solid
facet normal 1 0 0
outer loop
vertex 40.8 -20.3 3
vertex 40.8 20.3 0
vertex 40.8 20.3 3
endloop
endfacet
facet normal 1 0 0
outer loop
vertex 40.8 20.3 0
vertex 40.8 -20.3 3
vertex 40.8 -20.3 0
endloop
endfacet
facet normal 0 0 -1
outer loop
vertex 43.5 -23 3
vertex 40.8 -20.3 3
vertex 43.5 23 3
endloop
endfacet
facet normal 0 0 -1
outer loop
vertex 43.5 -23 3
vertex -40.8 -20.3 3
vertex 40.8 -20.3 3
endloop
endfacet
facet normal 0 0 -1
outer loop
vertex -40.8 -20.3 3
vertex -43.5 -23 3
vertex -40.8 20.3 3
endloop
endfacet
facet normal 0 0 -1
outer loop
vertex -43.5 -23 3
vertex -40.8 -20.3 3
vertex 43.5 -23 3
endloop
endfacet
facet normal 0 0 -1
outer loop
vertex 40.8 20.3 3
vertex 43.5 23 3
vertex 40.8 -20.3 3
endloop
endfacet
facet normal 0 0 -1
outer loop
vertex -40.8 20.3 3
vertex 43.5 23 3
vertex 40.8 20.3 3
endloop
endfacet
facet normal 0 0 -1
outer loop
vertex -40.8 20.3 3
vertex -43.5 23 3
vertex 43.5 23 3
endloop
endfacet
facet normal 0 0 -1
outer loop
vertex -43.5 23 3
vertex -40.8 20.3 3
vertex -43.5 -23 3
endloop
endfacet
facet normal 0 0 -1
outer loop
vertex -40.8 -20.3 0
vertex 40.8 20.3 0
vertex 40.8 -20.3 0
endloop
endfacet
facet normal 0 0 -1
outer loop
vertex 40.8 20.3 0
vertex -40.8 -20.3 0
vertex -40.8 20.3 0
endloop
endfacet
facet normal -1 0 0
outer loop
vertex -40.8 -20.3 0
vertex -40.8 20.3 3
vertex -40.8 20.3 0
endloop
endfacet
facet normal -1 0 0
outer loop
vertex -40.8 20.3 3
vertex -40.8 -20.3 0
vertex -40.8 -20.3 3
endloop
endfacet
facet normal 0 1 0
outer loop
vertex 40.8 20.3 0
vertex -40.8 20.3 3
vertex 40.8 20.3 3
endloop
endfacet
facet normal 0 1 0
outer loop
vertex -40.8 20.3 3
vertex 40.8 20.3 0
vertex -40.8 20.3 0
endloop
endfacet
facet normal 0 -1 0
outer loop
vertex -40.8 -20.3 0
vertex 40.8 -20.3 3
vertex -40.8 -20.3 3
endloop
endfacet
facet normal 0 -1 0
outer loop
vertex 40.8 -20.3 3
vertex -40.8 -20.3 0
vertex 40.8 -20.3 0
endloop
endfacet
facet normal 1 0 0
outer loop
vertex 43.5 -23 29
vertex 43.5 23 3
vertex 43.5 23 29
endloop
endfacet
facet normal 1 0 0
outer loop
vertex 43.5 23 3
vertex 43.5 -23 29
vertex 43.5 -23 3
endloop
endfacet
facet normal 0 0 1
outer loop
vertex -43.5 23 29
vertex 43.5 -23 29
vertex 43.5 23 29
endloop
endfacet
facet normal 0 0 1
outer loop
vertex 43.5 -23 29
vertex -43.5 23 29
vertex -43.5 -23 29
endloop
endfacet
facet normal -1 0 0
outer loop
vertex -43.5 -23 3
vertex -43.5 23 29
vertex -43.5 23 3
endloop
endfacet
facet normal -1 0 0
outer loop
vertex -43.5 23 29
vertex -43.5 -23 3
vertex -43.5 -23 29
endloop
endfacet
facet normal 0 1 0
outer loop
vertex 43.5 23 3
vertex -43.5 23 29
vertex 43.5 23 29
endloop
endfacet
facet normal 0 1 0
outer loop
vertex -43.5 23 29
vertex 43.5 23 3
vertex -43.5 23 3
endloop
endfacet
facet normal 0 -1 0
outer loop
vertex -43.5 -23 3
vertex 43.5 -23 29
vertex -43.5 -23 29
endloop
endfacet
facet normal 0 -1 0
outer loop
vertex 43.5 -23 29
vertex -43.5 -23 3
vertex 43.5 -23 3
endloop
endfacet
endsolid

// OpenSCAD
$fn = 64;

difference() {
	union() {
		translate(v = [-40.8, -20.3, 0]) {
			cube(size = [81.6, 40.6, 3]);
		}
		translate(v = [-43.5, -23.0, 3]) {
			cube(size = [87.0, 46.0, 26]);
		}
	}
	union();
}
